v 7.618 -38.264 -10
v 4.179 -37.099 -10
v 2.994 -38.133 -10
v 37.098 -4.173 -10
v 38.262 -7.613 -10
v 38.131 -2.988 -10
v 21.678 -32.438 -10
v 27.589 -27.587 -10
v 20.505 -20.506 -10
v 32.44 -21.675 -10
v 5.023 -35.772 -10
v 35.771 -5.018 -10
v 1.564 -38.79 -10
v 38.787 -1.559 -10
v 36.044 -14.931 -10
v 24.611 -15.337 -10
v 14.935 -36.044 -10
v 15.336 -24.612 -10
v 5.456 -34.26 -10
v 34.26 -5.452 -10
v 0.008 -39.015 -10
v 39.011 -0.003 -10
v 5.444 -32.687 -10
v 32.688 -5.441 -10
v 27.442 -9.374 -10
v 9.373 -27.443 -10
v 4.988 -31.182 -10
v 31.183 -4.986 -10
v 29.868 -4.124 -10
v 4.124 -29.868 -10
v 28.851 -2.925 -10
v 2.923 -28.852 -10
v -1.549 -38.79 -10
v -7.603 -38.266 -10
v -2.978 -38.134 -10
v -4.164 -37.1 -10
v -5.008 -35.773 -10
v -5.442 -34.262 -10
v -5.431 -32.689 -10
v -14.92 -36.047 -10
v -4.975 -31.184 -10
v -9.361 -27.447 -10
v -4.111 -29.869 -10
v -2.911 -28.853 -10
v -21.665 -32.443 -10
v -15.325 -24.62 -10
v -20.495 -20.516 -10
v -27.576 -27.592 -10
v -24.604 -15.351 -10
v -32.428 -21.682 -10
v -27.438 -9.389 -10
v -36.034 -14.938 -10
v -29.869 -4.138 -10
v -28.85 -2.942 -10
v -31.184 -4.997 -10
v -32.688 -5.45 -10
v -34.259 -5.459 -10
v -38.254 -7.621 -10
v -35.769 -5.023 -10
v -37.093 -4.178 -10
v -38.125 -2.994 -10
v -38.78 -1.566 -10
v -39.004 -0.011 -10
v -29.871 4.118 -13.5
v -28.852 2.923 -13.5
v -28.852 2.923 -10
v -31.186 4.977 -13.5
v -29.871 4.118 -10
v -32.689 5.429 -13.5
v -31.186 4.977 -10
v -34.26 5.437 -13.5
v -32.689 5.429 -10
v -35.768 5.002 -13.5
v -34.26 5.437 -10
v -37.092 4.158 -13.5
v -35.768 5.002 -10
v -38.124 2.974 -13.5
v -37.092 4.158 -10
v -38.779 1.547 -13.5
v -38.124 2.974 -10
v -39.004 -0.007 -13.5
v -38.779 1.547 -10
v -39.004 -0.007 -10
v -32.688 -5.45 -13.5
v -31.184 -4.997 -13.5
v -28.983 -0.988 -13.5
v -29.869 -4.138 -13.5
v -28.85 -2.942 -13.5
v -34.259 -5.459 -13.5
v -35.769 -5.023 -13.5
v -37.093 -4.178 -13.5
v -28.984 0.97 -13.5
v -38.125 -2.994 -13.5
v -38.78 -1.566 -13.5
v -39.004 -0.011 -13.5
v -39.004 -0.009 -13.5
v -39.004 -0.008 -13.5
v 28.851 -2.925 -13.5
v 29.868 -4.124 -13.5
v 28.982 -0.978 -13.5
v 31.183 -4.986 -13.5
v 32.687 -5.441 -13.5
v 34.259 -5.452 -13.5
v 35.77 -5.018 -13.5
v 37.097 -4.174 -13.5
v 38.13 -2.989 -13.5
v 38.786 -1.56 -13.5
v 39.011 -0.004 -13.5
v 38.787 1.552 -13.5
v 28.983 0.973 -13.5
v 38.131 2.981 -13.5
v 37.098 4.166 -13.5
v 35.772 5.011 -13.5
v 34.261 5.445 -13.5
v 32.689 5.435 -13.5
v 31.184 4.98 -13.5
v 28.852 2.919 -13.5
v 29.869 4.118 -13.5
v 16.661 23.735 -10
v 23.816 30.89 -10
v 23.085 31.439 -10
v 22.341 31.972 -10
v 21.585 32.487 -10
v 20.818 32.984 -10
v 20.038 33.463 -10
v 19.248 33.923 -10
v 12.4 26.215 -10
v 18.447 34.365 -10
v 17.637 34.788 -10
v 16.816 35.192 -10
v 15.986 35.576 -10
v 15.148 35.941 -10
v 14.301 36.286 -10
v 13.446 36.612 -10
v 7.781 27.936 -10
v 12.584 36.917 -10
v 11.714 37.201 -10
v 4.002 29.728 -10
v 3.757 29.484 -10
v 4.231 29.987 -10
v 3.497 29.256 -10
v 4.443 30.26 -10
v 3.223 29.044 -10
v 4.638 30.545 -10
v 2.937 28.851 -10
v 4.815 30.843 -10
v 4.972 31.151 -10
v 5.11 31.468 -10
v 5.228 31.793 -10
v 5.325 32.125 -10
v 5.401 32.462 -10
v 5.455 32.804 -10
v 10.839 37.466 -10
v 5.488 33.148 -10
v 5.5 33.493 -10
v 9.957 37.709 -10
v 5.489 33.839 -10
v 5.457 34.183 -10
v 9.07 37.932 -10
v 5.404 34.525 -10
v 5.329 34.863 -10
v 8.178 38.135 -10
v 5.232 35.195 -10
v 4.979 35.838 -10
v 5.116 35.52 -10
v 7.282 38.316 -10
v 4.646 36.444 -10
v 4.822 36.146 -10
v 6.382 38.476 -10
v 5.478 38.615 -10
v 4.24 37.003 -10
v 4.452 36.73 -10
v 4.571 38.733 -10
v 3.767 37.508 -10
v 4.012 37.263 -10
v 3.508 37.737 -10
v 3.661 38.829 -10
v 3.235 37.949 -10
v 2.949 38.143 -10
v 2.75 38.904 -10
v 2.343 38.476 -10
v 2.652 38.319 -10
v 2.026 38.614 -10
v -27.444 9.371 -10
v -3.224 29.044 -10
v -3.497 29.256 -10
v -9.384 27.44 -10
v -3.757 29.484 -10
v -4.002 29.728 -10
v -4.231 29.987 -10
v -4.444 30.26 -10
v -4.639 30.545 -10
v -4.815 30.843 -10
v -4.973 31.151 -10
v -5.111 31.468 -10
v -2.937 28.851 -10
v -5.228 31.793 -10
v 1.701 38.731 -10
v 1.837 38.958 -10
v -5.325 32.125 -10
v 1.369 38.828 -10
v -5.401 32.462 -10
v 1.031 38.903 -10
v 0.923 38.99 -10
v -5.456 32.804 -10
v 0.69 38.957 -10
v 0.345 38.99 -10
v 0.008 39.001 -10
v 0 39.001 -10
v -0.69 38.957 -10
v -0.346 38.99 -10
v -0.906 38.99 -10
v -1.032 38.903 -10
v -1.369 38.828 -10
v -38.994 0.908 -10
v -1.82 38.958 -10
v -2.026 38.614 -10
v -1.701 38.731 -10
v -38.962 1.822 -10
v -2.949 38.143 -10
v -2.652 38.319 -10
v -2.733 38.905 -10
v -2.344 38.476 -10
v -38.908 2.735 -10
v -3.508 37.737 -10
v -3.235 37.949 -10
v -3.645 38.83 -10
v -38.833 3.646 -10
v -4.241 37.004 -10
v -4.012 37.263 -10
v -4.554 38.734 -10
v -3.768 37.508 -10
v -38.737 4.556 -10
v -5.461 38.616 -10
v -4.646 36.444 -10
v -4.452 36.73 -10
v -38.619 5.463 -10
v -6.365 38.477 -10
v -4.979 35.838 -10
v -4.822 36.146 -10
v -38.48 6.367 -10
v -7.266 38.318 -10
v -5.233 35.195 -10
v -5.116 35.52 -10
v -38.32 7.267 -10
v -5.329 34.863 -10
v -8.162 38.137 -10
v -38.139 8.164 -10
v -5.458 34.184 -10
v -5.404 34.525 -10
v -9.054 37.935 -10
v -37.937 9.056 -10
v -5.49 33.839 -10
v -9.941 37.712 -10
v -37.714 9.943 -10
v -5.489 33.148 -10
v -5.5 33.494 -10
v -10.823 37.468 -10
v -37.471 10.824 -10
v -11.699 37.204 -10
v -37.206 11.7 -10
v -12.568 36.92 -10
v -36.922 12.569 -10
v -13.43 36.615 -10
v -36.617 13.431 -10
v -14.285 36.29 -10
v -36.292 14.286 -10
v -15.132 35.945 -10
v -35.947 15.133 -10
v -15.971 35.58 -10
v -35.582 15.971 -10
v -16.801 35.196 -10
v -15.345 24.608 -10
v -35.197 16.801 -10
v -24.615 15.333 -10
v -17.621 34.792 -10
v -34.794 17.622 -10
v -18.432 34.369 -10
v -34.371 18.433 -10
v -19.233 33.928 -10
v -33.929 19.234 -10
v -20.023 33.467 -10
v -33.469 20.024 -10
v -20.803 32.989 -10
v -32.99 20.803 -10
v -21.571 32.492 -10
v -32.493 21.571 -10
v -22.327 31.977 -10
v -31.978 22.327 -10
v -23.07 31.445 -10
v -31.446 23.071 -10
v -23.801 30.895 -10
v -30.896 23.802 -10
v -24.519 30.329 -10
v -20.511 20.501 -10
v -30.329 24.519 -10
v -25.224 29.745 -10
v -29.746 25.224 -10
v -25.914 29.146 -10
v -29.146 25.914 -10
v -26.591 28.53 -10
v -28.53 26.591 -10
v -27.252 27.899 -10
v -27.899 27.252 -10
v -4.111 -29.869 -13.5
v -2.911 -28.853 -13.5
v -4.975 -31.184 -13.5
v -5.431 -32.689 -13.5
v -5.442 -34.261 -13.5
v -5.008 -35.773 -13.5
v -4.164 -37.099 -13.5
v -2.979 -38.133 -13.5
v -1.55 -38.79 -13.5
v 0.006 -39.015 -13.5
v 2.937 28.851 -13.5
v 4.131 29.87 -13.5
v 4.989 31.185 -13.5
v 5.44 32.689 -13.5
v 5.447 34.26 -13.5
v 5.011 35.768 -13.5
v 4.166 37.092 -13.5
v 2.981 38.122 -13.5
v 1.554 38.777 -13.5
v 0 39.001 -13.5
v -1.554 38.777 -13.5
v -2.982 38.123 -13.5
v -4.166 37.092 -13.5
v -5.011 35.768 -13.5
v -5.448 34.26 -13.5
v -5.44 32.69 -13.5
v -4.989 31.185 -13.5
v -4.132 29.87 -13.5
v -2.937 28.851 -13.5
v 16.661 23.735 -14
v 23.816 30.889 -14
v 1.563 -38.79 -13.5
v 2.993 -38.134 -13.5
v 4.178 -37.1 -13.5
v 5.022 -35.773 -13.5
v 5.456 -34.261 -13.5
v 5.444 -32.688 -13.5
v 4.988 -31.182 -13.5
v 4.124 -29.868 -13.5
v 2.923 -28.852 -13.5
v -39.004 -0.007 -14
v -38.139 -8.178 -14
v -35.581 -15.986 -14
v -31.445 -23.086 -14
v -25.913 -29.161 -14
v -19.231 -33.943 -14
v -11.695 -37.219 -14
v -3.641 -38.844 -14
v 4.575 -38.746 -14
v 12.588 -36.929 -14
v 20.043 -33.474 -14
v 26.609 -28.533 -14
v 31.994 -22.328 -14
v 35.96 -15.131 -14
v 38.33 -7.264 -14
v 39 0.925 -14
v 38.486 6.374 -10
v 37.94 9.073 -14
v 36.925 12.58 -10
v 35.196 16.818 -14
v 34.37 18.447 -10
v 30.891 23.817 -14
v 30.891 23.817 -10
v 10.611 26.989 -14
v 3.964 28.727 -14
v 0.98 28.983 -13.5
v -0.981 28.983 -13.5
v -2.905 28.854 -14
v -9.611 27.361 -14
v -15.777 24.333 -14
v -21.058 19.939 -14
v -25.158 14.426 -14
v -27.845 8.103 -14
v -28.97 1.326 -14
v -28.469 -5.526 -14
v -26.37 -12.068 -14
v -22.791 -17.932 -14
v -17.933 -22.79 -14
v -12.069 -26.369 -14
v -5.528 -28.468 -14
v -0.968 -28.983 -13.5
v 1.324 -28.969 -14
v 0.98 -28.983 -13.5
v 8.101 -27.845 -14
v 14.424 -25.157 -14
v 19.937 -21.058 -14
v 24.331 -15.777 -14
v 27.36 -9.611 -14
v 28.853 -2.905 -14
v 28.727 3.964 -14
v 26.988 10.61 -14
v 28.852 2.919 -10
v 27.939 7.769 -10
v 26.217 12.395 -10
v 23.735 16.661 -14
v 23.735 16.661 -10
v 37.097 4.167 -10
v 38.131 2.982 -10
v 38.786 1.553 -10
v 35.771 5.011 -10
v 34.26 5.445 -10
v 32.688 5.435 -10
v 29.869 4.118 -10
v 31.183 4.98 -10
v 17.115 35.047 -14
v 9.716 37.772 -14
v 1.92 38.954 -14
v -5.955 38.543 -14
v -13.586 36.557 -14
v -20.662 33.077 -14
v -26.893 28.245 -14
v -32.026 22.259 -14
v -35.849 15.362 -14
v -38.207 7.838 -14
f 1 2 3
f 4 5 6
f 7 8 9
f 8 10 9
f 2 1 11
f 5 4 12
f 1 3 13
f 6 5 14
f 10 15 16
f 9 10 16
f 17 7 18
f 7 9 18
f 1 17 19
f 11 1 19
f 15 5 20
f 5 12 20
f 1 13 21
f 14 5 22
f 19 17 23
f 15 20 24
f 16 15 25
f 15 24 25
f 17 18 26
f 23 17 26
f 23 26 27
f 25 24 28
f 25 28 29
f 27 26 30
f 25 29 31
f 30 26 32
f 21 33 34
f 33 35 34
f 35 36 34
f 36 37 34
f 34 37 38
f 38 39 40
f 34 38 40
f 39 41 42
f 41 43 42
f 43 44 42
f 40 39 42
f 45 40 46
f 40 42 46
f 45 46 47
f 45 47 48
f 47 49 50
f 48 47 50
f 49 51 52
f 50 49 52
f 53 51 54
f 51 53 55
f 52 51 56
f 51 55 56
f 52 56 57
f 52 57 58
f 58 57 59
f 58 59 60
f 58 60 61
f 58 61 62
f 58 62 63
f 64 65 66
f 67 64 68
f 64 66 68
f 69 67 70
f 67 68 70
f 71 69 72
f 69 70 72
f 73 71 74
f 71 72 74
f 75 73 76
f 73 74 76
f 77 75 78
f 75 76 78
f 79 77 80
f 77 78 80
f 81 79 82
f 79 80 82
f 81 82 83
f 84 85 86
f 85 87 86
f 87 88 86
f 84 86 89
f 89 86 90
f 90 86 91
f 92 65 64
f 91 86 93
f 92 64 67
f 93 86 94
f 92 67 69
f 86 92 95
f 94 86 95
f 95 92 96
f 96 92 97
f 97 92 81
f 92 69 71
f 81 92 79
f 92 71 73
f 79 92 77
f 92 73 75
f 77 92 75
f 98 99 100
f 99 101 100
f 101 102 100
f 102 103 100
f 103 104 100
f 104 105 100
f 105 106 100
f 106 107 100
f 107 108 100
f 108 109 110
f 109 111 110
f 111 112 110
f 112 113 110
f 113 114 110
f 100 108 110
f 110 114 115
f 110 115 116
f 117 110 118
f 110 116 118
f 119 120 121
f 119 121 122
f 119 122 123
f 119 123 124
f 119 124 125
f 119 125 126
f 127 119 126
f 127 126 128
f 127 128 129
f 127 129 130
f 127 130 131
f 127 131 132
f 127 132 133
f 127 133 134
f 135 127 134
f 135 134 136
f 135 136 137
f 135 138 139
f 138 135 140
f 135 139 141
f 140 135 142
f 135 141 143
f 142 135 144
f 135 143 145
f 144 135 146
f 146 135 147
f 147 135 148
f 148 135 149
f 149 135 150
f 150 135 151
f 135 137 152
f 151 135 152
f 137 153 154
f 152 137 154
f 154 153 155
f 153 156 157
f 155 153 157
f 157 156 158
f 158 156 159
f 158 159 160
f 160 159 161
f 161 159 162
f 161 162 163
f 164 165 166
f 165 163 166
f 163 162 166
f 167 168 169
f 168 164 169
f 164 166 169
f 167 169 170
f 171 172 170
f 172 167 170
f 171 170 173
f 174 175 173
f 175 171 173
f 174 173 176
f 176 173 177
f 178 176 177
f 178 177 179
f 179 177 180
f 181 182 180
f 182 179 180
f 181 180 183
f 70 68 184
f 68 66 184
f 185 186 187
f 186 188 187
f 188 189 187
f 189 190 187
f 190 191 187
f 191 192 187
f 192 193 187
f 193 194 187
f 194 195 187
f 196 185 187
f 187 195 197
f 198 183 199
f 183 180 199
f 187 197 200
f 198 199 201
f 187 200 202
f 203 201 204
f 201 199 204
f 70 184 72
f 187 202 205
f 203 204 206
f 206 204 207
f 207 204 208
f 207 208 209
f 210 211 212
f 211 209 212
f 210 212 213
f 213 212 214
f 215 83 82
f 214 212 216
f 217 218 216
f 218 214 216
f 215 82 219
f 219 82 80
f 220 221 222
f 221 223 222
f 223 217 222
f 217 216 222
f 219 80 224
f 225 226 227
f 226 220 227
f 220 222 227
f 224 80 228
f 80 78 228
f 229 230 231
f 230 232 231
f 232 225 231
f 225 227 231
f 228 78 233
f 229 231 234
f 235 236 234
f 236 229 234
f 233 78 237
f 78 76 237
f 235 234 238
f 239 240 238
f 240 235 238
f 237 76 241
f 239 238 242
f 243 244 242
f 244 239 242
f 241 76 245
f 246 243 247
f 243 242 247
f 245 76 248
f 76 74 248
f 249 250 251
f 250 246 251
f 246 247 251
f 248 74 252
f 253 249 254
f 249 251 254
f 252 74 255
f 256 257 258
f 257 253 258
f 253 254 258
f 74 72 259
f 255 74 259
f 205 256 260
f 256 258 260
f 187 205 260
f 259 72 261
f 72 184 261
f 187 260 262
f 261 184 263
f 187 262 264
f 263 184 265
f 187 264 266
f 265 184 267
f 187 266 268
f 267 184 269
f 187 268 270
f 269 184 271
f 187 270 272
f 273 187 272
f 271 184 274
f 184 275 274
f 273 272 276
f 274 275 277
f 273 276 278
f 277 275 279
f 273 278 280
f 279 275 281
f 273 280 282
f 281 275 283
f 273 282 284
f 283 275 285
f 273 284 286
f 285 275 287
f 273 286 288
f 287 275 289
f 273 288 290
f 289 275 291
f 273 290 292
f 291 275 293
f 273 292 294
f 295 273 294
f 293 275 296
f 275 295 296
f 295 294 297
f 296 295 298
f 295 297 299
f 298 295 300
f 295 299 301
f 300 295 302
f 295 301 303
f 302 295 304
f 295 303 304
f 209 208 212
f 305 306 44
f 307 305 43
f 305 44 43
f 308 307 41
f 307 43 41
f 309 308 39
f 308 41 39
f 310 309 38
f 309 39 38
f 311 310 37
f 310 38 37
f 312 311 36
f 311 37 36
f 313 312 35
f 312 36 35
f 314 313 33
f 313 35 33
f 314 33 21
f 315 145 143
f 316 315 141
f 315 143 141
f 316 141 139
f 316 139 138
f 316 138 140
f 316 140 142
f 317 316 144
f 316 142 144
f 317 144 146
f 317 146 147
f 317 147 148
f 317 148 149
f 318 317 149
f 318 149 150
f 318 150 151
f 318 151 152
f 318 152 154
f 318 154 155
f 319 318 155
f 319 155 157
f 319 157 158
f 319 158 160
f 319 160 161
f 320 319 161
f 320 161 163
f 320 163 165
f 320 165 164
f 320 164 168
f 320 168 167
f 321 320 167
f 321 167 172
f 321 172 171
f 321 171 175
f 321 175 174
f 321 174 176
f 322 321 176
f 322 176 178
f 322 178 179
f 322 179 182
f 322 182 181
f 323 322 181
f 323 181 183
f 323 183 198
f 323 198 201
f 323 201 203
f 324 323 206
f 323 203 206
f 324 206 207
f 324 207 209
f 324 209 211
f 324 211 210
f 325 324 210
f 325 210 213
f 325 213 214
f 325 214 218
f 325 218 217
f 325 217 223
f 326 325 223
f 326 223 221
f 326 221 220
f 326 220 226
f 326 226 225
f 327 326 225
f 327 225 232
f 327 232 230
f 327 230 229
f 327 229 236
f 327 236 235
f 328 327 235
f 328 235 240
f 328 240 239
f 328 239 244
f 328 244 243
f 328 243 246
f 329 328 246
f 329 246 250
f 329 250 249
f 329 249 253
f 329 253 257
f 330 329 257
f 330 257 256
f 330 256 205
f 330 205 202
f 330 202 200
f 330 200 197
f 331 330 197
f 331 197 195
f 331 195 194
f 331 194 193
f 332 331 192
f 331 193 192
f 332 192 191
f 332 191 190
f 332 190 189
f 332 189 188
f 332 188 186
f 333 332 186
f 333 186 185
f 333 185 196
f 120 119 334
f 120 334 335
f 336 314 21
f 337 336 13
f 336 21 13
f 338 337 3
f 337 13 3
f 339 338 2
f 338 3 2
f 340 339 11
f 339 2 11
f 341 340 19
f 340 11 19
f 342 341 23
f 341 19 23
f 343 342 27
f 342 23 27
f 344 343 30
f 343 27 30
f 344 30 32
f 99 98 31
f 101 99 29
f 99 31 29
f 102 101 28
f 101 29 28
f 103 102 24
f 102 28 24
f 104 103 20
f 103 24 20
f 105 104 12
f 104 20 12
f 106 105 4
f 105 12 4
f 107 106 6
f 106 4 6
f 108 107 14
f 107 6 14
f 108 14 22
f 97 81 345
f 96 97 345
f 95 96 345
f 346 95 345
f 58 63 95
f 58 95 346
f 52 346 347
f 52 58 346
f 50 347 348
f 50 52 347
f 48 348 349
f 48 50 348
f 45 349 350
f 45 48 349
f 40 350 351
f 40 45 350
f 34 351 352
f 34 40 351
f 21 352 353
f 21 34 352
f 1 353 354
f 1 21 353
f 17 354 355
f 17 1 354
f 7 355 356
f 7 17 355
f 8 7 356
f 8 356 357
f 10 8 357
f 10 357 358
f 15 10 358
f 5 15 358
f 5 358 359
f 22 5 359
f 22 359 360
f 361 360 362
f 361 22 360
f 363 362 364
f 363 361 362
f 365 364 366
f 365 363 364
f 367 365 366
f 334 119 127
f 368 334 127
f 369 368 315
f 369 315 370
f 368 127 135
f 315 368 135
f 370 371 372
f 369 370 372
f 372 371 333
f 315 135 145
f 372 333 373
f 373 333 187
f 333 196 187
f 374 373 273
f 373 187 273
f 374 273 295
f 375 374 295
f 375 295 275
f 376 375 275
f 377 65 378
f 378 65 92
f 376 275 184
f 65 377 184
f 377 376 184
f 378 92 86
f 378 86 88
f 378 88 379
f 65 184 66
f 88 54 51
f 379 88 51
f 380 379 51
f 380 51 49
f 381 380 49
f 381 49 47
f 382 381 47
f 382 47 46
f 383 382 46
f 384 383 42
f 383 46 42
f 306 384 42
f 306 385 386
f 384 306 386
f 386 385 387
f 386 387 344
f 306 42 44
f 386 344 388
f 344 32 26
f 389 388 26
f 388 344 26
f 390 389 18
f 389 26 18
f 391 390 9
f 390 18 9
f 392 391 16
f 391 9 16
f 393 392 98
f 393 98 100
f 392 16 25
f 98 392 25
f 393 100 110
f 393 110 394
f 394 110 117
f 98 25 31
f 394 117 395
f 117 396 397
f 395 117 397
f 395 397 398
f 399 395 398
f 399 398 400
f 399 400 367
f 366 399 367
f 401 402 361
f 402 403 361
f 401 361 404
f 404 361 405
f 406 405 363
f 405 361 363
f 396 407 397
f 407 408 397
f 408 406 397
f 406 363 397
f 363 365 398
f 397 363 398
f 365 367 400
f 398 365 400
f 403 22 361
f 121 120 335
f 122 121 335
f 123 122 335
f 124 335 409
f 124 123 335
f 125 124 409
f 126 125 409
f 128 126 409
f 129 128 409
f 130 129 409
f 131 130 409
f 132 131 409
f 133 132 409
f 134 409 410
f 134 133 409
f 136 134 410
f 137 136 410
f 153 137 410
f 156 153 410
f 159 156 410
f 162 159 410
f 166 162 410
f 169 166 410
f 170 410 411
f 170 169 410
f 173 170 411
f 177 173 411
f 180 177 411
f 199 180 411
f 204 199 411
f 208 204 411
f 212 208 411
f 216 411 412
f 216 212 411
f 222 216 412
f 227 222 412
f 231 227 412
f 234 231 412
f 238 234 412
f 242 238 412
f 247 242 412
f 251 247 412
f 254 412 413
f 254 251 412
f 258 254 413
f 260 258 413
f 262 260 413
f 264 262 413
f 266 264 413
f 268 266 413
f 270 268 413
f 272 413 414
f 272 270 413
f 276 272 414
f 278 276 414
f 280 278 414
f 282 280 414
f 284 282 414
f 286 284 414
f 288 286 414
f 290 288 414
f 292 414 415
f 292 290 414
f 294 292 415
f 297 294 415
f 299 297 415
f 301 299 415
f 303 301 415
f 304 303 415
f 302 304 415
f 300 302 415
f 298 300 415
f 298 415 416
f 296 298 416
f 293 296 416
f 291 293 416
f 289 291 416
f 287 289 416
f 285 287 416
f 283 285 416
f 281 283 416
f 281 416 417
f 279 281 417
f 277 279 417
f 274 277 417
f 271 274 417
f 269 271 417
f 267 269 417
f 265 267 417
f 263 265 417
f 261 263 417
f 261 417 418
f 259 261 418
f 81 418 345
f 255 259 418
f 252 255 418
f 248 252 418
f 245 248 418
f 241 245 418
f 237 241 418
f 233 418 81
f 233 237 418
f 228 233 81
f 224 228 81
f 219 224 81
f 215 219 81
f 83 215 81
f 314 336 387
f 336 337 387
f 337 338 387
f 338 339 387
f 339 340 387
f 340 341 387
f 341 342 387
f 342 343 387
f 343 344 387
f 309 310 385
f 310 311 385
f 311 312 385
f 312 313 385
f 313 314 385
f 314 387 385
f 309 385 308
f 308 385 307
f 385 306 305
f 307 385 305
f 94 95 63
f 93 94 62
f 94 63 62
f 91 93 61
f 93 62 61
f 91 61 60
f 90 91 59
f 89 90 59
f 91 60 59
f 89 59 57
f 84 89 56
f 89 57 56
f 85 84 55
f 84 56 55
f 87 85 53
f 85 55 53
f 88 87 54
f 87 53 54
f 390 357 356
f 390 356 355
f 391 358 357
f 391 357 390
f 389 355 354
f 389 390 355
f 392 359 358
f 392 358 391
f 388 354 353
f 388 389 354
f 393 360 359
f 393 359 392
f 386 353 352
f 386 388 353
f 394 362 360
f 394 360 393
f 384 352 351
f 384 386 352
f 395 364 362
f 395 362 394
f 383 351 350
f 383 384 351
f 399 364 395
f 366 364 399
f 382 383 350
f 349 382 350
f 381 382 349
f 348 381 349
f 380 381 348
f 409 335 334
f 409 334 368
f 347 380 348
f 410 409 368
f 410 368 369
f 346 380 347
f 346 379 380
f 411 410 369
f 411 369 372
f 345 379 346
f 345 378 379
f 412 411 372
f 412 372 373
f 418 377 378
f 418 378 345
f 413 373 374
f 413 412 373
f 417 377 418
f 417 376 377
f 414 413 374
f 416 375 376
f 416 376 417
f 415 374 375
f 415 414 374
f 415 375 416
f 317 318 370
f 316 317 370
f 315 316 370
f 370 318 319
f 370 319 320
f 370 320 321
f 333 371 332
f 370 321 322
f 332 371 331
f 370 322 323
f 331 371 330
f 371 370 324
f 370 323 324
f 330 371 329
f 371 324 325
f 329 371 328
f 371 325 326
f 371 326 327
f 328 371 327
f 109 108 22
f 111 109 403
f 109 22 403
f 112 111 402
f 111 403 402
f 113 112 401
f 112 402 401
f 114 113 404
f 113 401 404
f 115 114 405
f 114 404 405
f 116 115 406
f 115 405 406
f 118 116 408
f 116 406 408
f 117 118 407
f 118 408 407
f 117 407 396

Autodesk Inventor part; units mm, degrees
ref_plane "YZ Plane" through (0, 0, 0) normal (1, 0, 0) x (0, 1, 0)
ref_plane "XZ Plane" through (0, 0, 0) normal (0, 1, 0) x (-1, 0, 0)
sketch "Sketch1" plane through (15.1716, 31.1499, -10) normal (0, 0, -1) x (-1, 0, 0)
  circle A0 centre (15.1718, 2.3509) radius 5.5
  circle A1 centre (15.1682, -31.1568) radius 39.0078 projected
  line L0 (15.1682, 16.6184) -> (15.1682, -92.5886) construction
  line L1 (67.6065, -31.1568) -> (-2.4603, -31.1568) construction
  circle A2 centre (-18.3396, -31.1532) radius 5.5
  circle A3 centre (15.1646, -64.6646) radius 5.5
  circle A4 centre (48.676, -31.1605) radius 5.5
  circle A5 centre (15.1721, -31.1497) radius 28.9995 projected
  circle A6 centre (15.1721, -31.1497) radius 39.0149
  circle A7 centre (15.1721, -31.1497) radius 28.9995
  point P0 (15.1716, -31.1499)
  point P1 (-17.7938, -52.0162)
  point P2 (15.182, -70.1646)
  point P3 (-13.6795, -34.0745)
  point P4 (-13.6801, -28.231)
  point P5 (18.083, -60.0028)
  point P6 (12.2483, -60.0015)
  point P7 (54.176, -31.1611)
  point P8 (54.176, -31.1568)
  dimension "d0" = 11
  dimension "d3" = 360
extrude "Extrusion1" add sketch "Sketch1" along normal blind 4 contours A0 A5 | A0 A1 A4 A5 | A1 A6 | A0 A5 A2 A1 | A1 A4 A5 | A2 A5 A3 A1 | A2 A5 | A1 A3 A5 A4 | A3 A5 picked at (15.172, 1.1724) picked at (-17.1539, -31.1527) picked at (15.165, -63.4768)
extrude "Extrusion2" cut sketch "Sketch1" along normal blind 3.5 contours A0 A5 | A0 A5 | A1 A4 A5 | A2 A5 | A5 A4 | A3 A5 picked at (-17.1539, -31.1527) picked at (15.165, -63.4768)
sketch "Sketch3" plane through (0, 0, 0) normal (0, 1, 0) x (-1, 0, 0)
  point P0 (0, 0)
sketch "Sketch4" plane through (15.1716, 31.1499, -14) normal (0, 0, -1) x (-1, 0, 0)
  line L0 (15.1716, -11.9634) -> (15.1716, -53.9026)
  line L1 (30.3972, -46.3755) -> (6.4991, -22.4774)
  point P0 (15.1716, -31.1499)
  dimension "d9" = 135
ref_plane "Work Plane1" through (-15.2256, -15.2256, -14) normal (0.7071, -0.7071, 0) x (0.7071, 0.7071, 0)
sketch "Sketch5" plane through (-15.2256, -15.2256, -14) normal (0.7071, -0.7071, 0) x (0.7071, 0.7071, 0)
  line L0 (50.5315, 0) -> (50.5315, 4) projected
  line L1 (50.5315, -1.9282) -> (46.5682, 5.2134)
  line L2 (46.5682, 5.2134) -> (63.3976, 5.2134)
  line L3 (63.3976, 5.2134) -> (68.7285, -4.3924)
  line L4 (68.7285, -4.3924) -> (51.8991, -4.3924)
  line L5 (51.8991, -4.3924) -> (50.5315, -1.9282)
  point P0 (21.5323, 14)
extrude "Extrusion3" cut sketch "Sketch5" along normal mid plane 10
properties part number "Top holder magnet"
